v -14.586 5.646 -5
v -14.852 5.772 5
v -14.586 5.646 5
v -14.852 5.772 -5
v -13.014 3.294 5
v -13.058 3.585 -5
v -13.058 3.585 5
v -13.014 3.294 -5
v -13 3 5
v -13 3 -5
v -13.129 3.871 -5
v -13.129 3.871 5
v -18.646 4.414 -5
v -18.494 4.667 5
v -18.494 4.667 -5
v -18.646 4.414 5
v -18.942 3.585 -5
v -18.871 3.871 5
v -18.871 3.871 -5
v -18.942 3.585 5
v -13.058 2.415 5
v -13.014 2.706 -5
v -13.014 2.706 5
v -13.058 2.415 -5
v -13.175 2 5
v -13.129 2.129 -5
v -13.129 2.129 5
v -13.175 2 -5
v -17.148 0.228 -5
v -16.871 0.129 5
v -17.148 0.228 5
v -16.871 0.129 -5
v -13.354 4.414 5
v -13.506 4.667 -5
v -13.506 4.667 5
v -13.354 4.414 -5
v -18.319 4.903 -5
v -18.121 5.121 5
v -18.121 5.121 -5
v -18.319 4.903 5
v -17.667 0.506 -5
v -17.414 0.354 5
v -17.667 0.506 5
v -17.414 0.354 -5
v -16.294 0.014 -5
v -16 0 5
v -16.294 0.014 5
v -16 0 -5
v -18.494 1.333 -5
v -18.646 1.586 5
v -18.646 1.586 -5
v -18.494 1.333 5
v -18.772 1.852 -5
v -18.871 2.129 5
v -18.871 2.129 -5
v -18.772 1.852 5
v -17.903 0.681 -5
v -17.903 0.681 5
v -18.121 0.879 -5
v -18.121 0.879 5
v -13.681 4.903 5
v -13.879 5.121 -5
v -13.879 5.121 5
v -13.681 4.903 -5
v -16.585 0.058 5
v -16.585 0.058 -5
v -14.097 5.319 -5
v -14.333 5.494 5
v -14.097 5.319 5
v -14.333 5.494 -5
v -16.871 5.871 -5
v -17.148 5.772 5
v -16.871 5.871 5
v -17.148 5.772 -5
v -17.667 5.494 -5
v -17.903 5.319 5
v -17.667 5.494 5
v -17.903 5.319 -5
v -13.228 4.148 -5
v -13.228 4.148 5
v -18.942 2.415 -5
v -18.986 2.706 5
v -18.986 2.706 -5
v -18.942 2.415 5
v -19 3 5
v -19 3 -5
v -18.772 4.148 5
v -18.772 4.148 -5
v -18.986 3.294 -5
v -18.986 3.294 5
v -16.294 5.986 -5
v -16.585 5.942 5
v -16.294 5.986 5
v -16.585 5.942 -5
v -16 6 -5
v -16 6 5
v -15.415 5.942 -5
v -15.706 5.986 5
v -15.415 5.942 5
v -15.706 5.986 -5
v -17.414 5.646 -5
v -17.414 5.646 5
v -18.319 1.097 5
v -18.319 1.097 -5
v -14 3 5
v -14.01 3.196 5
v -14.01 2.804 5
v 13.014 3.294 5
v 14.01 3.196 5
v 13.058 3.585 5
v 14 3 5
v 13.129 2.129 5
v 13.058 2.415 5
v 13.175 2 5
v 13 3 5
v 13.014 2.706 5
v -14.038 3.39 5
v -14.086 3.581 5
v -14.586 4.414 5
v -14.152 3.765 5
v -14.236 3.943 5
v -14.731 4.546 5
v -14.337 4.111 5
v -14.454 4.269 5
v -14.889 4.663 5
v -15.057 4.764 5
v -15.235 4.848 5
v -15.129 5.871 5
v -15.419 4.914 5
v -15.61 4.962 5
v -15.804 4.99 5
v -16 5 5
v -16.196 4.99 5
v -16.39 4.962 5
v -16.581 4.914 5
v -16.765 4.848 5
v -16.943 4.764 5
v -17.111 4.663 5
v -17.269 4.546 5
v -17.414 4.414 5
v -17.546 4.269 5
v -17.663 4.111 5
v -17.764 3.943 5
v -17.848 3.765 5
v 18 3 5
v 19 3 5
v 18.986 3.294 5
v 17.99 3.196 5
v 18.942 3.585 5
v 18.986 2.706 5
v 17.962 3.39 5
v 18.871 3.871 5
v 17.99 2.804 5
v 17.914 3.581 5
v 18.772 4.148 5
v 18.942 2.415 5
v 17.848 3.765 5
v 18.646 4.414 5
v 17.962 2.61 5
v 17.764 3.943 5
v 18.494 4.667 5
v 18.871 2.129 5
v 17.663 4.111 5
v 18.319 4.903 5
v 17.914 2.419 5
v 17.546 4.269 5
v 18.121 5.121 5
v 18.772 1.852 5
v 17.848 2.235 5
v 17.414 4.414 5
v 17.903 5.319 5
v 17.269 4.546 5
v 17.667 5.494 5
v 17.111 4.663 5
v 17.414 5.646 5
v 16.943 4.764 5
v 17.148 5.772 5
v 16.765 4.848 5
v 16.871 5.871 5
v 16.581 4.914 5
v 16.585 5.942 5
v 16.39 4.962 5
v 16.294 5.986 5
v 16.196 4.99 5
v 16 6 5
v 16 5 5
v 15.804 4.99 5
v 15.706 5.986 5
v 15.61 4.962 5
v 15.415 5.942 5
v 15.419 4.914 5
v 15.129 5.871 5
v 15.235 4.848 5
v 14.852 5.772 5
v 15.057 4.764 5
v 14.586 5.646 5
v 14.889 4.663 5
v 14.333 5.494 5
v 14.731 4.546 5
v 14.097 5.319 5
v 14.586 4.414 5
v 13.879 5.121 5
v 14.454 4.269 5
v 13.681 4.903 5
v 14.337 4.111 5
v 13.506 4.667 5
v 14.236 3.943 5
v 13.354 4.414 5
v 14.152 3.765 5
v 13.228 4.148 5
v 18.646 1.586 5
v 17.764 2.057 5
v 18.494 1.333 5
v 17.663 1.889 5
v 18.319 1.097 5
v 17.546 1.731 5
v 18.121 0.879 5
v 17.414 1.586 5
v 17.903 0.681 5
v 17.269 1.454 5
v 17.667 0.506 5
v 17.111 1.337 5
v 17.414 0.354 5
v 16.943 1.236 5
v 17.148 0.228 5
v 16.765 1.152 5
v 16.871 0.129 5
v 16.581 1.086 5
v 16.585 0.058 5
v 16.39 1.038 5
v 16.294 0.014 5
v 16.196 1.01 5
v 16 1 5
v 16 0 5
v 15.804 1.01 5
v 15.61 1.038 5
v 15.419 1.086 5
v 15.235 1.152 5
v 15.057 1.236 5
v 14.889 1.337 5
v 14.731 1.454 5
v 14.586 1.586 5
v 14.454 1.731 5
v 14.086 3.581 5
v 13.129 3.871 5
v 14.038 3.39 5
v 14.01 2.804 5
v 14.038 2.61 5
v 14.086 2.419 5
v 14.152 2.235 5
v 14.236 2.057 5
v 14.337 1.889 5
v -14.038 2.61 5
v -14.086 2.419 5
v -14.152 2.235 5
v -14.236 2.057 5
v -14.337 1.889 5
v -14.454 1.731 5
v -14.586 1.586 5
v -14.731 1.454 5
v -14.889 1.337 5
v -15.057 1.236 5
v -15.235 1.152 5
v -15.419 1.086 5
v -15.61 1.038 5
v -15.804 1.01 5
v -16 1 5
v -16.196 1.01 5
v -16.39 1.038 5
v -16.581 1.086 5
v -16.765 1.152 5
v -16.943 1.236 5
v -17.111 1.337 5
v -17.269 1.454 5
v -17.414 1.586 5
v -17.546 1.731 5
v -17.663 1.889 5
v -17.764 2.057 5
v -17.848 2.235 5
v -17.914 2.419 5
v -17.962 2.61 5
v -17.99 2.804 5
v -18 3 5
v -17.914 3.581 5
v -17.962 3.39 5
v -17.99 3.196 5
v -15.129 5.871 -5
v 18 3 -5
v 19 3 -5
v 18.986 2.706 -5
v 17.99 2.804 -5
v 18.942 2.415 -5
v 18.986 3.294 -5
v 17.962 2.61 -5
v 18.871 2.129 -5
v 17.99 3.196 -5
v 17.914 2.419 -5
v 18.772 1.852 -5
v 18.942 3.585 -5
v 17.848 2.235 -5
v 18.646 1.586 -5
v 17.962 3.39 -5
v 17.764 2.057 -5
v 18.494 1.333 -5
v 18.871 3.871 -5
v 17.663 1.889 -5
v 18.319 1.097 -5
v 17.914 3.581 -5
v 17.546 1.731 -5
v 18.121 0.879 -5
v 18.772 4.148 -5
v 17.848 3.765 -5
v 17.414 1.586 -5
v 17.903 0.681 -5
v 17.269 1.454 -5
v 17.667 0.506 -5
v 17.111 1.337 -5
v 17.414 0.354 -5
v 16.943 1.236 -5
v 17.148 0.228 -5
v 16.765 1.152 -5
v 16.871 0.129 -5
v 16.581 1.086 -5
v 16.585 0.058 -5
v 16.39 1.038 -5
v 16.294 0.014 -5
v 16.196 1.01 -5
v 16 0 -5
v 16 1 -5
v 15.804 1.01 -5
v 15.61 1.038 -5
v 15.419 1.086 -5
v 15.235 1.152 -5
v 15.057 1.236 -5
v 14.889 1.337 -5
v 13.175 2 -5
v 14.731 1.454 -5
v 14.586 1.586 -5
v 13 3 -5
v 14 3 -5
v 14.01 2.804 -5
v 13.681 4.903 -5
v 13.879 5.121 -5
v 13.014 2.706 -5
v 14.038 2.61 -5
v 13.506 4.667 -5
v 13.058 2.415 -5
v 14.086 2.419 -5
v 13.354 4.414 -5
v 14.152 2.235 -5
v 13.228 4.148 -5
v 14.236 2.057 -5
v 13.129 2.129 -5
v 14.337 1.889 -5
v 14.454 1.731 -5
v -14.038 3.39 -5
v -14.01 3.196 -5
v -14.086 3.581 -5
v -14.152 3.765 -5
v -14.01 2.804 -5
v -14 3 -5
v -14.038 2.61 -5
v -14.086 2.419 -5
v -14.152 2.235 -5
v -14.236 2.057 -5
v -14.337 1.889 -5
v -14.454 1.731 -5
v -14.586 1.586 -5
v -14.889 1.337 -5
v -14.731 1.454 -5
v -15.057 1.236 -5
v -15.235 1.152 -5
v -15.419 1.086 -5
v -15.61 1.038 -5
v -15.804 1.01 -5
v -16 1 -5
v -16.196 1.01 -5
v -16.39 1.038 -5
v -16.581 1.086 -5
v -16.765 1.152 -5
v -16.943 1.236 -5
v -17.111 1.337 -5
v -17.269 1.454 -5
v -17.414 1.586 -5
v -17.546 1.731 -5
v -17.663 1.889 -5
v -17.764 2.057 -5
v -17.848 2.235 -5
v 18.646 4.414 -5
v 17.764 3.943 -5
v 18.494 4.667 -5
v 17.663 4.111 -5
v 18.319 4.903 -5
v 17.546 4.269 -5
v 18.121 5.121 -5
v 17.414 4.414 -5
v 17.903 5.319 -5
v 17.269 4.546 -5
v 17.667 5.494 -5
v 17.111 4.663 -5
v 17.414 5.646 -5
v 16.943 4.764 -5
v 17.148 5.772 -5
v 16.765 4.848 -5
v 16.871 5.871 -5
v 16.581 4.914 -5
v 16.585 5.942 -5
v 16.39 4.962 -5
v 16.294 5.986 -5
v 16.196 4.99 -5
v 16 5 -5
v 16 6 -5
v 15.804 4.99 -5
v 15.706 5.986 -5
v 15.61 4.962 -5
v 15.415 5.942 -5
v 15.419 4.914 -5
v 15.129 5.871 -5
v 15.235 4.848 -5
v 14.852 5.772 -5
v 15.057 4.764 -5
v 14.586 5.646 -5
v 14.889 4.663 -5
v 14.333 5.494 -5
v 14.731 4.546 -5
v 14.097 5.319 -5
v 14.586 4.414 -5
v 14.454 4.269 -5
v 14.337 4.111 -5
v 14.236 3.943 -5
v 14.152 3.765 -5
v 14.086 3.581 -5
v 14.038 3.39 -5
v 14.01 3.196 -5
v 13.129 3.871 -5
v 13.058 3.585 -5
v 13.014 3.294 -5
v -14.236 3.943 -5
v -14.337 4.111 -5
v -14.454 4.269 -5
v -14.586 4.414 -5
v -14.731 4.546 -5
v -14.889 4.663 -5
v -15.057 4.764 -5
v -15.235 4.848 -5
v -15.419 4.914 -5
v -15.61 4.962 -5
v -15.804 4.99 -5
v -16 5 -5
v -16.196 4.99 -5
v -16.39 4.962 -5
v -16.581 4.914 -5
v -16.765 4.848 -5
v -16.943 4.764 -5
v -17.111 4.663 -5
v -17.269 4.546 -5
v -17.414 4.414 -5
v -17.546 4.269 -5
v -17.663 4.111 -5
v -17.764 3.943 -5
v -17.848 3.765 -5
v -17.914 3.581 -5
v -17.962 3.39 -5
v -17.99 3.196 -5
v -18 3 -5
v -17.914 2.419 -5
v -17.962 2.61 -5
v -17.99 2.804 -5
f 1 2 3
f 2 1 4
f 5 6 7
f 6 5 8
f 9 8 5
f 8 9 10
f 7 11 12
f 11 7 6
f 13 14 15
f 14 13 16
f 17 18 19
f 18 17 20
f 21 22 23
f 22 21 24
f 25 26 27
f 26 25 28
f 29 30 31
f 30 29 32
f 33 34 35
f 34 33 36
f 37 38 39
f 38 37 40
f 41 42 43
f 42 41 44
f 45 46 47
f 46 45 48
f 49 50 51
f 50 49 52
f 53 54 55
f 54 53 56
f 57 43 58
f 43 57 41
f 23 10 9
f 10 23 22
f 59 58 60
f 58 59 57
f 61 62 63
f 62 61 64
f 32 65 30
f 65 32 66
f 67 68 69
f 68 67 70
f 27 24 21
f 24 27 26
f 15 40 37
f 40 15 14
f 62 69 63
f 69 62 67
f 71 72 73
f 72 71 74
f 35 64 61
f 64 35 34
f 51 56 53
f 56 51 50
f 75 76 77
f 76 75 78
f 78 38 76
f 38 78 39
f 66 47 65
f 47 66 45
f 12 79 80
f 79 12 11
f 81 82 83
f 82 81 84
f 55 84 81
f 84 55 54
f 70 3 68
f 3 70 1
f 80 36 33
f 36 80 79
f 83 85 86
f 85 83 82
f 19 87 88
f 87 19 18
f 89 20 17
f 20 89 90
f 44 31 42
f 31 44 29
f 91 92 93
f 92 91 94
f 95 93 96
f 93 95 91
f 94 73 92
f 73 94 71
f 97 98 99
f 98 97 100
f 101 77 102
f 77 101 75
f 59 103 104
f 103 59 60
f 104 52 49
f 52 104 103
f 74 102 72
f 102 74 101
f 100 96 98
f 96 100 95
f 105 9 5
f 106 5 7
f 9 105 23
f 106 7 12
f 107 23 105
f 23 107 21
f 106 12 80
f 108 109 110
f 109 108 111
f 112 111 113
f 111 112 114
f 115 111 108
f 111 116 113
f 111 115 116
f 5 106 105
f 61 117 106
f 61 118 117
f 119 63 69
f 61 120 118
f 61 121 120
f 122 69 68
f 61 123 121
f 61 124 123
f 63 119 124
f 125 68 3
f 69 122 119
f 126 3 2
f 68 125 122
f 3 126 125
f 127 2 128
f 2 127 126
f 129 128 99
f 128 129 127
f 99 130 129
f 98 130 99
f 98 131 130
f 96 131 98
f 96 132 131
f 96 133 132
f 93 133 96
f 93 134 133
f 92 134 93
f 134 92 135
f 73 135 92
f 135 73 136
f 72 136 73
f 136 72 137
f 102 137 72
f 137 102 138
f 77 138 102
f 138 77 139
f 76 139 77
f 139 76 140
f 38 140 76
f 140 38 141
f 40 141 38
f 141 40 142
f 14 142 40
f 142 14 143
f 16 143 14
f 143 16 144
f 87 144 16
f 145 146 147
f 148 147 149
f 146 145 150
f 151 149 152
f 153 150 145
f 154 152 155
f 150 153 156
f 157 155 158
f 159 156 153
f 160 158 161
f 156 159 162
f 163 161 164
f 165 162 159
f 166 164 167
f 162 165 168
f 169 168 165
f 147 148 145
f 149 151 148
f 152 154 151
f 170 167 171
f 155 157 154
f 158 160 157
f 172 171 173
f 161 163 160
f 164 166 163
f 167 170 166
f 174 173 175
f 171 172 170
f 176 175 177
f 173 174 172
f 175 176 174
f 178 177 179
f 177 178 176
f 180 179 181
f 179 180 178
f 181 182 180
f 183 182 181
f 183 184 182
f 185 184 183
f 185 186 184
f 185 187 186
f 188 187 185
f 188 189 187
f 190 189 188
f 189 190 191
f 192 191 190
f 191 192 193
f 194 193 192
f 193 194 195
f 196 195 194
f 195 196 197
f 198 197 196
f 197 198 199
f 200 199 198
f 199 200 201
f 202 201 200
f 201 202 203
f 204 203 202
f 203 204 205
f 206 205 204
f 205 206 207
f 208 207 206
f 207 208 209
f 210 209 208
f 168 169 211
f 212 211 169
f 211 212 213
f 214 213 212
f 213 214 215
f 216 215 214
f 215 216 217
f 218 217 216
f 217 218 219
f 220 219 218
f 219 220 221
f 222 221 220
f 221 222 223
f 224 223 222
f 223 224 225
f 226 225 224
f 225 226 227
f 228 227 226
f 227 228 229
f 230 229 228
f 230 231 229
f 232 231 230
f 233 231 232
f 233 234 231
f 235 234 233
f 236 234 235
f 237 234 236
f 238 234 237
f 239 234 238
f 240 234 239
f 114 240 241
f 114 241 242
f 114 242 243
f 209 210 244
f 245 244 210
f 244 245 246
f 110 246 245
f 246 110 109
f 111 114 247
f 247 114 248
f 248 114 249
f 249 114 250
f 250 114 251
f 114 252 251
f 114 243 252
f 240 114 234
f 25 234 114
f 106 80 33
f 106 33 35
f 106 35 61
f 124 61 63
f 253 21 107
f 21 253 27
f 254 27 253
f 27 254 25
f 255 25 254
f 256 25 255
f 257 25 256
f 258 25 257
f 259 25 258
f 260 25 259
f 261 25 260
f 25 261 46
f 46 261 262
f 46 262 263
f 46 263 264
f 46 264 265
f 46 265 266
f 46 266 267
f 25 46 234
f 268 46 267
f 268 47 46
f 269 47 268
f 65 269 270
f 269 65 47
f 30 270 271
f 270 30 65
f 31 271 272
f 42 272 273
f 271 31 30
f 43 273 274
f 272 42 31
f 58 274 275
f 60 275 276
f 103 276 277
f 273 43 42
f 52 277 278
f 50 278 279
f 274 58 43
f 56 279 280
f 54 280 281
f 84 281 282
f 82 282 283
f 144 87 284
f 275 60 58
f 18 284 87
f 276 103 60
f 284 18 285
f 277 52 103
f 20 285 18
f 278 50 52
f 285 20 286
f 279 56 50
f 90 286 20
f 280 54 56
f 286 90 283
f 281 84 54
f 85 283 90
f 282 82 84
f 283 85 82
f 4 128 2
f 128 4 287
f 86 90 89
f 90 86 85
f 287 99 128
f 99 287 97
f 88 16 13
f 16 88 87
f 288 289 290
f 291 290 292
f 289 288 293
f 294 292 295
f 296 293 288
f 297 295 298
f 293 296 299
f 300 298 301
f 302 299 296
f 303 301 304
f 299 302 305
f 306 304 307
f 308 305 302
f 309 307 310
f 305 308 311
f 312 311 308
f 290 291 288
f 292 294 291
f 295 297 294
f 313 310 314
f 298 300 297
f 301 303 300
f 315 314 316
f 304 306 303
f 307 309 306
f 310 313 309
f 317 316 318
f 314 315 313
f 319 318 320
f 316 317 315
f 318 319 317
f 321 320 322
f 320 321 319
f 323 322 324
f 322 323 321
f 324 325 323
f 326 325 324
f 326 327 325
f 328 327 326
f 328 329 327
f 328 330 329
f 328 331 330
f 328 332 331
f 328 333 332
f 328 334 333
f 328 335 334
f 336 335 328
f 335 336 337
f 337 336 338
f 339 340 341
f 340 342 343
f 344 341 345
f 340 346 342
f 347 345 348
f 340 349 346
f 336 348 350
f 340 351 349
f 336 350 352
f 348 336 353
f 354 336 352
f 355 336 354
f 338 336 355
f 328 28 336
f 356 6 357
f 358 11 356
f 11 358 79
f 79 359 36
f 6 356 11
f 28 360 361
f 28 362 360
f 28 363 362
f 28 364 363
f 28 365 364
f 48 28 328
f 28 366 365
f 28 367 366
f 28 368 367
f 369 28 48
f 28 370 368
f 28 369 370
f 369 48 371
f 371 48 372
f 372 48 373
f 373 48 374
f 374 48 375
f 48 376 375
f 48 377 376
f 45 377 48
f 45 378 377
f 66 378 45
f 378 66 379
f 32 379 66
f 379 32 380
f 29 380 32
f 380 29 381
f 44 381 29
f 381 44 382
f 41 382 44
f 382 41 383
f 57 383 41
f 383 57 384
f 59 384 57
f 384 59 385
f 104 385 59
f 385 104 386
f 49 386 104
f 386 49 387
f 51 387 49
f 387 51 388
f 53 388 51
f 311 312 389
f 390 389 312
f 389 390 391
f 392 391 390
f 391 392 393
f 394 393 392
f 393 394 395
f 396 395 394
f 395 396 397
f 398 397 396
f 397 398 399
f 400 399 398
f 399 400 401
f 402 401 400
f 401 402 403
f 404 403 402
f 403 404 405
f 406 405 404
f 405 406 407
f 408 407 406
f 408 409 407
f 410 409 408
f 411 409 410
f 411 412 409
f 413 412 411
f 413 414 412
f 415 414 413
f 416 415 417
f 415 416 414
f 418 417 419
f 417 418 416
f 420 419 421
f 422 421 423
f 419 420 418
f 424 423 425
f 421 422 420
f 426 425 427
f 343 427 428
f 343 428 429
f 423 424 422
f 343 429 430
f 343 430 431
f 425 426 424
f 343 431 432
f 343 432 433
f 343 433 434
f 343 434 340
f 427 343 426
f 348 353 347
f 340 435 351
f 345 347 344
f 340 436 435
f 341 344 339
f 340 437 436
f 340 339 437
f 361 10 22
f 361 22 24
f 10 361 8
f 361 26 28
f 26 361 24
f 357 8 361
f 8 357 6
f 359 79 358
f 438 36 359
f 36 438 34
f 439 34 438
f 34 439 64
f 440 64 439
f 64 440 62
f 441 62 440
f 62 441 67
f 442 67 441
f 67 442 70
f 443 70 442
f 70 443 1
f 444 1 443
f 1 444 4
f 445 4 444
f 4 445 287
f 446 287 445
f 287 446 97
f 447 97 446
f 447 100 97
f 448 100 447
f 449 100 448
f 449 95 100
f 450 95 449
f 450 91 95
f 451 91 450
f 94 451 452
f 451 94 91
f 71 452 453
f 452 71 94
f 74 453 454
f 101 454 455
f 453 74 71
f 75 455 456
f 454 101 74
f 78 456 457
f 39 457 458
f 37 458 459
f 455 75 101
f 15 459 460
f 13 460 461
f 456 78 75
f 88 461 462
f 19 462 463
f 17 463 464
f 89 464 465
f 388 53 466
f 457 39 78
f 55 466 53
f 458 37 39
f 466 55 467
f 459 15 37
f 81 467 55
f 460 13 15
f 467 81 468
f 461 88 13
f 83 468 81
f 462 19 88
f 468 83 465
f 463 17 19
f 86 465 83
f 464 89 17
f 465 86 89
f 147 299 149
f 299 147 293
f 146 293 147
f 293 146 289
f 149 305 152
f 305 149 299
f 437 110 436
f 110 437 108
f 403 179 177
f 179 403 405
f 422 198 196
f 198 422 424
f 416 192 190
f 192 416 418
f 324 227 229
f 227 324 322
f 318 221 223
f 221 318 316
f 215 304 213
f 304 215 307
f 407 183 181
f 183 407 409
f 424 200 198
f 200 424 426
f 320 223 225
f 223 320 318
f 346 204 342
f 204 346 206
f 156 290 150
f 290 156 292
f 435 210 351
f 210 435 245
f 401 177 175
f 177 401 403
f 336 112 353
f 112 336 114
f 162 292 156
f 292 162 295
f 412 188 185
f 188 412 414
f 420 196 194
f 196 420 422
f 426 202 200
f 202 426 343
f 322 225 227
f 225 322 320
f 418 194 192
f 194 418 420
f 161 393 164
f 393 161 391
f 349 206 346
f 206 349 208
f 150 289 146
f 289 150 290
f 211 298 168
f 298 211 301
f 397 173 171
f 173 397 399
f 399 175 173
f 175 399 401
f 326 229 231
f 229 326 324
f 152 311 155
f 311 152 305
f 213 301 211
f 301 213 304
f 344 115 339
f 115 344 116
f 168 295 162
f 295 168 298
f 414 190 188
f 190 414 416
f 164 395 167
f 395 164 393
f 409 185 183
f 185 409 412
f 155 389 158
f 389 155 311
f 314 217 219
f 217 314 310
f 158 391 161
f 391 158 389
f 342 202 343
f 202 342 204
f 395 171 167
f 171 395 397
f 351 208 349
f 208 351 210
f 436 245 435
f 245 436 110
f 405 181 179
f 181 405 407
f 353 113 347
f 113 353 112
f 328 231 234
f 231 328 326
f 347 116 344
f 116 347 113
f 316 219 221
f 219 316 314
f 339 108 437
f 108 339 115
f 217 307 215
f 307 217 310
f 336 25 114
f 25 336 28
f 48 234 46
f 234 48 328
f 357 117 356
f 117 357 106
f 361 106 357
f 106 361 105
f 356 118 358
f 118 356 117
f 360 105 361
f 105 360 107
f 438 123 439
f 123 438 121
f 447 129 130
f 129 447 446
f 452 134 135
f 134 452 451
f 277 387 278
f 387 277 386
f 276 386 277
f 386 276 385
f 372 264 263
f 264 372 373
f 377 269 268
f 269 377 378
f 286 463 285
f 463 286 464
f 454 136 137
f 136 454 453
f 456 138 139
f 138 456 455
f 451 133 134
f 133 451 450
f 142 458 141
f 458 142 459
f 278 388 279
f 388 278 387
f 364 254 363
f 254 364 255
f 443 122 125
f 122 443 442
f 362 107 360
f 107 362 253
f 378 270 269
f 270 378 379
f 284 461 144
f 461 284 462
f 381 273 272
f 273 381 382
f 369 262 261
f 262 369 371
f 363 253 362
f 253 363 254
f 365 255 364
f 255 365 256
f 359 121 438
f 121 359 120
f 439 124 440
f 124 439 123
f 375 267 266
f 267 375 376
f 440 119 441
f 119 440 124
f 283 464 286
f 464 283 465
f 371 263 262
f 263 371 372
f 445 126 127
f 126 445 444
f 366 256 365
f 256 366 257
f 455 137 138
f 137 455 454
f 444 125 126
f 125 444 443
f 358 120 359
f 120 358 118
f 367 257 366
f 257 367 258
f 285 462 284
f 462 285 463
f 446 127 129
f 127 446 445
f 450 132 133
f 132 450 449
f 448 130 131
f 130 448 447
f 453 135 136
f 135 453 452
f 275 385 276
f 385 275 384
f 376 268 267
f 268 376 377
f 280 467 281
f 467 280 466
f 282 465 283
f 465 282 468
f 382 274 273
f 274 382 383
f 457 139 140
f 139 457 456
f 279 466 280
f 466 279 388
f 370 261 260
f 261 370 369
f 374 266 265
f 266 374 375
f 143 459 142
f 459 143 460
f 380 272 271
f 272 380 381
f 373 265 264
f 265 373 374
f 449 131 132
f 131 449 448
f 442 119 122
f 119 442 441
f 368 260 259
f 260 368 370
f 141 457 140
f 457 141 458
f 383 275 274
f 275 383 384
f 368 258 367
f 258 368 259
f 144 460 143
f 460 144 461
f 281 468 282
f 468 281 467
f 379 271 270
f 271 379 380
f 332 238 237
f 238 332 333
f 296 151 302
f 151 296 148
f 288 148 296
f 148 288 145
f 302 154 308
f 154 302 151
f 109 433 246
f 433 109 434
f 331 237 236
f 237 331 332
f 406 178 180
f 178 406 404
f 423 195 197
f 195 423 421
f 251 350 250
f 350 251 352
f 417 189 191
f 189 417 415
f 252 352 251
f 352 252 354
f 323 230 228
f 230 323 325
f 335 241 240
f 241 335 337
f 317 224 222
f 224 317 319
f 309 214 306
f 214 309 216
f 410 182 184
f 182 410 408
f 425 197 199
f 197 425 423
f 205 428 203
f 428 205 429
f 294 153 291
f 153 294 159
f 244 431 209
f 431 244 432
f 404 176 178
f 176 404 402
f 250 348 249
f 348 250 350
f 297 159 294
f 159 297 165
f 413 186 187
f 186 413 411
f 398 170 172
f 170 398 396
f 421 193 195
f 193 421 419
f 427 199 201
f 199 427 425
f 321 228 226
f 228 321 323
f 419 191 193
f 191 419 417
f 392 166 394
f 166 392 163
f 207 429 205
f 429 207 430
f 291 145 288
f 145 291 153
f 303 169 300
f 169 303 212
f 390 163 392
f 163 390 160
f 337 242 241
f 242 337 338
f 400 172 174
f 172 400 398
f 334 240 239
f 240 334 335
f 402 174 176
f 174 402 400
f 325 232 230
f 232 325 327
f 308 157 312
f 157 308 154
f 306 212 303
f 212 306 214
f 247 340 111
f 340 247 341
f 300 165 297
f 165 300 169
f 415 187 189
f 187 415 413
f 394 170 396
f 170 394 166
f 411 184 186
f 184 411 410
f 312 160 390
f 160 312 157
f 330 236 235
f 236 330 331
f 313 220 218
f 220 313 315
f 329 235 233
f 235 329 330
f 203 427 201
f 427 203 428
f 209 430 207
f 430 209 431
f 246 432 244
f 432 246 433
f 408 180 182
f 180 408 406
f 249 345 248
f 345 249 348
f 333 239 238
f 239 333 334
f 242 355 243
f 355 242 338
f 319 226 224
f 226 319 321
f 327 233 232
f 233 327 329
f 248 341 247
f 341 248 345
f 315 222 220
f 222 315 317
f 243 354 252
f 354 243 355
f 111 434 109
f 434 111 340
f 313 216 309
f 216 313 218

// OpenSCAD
spacerDiameter = 4;
spacerWidth = 32;
spacerThickness = 1;
wallThickness = 2;
wallHeight = 10;


difference() {
	union() {
		translate([0,wallThickness/2,0])
		cube([spacerWidth,wallThickness,wallHeight],center=true);

		SpacerWrapper();
	}
	SpacerHole();
}

module SpacerWrapper() {
	for (xPos = [-spacerWidth/2, spacerWidth/2]) {
		translate([xPos,(spacerDiameter+spacerThickness*2)/2,0])
		cylinder(d=spacerDiameter+spacerThickness*2,h=wallHeight,$fn=64,center=true);
	}
}
module SpacerHole() {
	for (xPos = [-spacerWidth/2, spacerWidth/2]) {
		translate([xPos,(spacerDiameter+spacerThickness*2)/2,0])
		cylinder(d=spacerDiameter,h=wallHeight+2,$fn=64,center=true);
	}
}
